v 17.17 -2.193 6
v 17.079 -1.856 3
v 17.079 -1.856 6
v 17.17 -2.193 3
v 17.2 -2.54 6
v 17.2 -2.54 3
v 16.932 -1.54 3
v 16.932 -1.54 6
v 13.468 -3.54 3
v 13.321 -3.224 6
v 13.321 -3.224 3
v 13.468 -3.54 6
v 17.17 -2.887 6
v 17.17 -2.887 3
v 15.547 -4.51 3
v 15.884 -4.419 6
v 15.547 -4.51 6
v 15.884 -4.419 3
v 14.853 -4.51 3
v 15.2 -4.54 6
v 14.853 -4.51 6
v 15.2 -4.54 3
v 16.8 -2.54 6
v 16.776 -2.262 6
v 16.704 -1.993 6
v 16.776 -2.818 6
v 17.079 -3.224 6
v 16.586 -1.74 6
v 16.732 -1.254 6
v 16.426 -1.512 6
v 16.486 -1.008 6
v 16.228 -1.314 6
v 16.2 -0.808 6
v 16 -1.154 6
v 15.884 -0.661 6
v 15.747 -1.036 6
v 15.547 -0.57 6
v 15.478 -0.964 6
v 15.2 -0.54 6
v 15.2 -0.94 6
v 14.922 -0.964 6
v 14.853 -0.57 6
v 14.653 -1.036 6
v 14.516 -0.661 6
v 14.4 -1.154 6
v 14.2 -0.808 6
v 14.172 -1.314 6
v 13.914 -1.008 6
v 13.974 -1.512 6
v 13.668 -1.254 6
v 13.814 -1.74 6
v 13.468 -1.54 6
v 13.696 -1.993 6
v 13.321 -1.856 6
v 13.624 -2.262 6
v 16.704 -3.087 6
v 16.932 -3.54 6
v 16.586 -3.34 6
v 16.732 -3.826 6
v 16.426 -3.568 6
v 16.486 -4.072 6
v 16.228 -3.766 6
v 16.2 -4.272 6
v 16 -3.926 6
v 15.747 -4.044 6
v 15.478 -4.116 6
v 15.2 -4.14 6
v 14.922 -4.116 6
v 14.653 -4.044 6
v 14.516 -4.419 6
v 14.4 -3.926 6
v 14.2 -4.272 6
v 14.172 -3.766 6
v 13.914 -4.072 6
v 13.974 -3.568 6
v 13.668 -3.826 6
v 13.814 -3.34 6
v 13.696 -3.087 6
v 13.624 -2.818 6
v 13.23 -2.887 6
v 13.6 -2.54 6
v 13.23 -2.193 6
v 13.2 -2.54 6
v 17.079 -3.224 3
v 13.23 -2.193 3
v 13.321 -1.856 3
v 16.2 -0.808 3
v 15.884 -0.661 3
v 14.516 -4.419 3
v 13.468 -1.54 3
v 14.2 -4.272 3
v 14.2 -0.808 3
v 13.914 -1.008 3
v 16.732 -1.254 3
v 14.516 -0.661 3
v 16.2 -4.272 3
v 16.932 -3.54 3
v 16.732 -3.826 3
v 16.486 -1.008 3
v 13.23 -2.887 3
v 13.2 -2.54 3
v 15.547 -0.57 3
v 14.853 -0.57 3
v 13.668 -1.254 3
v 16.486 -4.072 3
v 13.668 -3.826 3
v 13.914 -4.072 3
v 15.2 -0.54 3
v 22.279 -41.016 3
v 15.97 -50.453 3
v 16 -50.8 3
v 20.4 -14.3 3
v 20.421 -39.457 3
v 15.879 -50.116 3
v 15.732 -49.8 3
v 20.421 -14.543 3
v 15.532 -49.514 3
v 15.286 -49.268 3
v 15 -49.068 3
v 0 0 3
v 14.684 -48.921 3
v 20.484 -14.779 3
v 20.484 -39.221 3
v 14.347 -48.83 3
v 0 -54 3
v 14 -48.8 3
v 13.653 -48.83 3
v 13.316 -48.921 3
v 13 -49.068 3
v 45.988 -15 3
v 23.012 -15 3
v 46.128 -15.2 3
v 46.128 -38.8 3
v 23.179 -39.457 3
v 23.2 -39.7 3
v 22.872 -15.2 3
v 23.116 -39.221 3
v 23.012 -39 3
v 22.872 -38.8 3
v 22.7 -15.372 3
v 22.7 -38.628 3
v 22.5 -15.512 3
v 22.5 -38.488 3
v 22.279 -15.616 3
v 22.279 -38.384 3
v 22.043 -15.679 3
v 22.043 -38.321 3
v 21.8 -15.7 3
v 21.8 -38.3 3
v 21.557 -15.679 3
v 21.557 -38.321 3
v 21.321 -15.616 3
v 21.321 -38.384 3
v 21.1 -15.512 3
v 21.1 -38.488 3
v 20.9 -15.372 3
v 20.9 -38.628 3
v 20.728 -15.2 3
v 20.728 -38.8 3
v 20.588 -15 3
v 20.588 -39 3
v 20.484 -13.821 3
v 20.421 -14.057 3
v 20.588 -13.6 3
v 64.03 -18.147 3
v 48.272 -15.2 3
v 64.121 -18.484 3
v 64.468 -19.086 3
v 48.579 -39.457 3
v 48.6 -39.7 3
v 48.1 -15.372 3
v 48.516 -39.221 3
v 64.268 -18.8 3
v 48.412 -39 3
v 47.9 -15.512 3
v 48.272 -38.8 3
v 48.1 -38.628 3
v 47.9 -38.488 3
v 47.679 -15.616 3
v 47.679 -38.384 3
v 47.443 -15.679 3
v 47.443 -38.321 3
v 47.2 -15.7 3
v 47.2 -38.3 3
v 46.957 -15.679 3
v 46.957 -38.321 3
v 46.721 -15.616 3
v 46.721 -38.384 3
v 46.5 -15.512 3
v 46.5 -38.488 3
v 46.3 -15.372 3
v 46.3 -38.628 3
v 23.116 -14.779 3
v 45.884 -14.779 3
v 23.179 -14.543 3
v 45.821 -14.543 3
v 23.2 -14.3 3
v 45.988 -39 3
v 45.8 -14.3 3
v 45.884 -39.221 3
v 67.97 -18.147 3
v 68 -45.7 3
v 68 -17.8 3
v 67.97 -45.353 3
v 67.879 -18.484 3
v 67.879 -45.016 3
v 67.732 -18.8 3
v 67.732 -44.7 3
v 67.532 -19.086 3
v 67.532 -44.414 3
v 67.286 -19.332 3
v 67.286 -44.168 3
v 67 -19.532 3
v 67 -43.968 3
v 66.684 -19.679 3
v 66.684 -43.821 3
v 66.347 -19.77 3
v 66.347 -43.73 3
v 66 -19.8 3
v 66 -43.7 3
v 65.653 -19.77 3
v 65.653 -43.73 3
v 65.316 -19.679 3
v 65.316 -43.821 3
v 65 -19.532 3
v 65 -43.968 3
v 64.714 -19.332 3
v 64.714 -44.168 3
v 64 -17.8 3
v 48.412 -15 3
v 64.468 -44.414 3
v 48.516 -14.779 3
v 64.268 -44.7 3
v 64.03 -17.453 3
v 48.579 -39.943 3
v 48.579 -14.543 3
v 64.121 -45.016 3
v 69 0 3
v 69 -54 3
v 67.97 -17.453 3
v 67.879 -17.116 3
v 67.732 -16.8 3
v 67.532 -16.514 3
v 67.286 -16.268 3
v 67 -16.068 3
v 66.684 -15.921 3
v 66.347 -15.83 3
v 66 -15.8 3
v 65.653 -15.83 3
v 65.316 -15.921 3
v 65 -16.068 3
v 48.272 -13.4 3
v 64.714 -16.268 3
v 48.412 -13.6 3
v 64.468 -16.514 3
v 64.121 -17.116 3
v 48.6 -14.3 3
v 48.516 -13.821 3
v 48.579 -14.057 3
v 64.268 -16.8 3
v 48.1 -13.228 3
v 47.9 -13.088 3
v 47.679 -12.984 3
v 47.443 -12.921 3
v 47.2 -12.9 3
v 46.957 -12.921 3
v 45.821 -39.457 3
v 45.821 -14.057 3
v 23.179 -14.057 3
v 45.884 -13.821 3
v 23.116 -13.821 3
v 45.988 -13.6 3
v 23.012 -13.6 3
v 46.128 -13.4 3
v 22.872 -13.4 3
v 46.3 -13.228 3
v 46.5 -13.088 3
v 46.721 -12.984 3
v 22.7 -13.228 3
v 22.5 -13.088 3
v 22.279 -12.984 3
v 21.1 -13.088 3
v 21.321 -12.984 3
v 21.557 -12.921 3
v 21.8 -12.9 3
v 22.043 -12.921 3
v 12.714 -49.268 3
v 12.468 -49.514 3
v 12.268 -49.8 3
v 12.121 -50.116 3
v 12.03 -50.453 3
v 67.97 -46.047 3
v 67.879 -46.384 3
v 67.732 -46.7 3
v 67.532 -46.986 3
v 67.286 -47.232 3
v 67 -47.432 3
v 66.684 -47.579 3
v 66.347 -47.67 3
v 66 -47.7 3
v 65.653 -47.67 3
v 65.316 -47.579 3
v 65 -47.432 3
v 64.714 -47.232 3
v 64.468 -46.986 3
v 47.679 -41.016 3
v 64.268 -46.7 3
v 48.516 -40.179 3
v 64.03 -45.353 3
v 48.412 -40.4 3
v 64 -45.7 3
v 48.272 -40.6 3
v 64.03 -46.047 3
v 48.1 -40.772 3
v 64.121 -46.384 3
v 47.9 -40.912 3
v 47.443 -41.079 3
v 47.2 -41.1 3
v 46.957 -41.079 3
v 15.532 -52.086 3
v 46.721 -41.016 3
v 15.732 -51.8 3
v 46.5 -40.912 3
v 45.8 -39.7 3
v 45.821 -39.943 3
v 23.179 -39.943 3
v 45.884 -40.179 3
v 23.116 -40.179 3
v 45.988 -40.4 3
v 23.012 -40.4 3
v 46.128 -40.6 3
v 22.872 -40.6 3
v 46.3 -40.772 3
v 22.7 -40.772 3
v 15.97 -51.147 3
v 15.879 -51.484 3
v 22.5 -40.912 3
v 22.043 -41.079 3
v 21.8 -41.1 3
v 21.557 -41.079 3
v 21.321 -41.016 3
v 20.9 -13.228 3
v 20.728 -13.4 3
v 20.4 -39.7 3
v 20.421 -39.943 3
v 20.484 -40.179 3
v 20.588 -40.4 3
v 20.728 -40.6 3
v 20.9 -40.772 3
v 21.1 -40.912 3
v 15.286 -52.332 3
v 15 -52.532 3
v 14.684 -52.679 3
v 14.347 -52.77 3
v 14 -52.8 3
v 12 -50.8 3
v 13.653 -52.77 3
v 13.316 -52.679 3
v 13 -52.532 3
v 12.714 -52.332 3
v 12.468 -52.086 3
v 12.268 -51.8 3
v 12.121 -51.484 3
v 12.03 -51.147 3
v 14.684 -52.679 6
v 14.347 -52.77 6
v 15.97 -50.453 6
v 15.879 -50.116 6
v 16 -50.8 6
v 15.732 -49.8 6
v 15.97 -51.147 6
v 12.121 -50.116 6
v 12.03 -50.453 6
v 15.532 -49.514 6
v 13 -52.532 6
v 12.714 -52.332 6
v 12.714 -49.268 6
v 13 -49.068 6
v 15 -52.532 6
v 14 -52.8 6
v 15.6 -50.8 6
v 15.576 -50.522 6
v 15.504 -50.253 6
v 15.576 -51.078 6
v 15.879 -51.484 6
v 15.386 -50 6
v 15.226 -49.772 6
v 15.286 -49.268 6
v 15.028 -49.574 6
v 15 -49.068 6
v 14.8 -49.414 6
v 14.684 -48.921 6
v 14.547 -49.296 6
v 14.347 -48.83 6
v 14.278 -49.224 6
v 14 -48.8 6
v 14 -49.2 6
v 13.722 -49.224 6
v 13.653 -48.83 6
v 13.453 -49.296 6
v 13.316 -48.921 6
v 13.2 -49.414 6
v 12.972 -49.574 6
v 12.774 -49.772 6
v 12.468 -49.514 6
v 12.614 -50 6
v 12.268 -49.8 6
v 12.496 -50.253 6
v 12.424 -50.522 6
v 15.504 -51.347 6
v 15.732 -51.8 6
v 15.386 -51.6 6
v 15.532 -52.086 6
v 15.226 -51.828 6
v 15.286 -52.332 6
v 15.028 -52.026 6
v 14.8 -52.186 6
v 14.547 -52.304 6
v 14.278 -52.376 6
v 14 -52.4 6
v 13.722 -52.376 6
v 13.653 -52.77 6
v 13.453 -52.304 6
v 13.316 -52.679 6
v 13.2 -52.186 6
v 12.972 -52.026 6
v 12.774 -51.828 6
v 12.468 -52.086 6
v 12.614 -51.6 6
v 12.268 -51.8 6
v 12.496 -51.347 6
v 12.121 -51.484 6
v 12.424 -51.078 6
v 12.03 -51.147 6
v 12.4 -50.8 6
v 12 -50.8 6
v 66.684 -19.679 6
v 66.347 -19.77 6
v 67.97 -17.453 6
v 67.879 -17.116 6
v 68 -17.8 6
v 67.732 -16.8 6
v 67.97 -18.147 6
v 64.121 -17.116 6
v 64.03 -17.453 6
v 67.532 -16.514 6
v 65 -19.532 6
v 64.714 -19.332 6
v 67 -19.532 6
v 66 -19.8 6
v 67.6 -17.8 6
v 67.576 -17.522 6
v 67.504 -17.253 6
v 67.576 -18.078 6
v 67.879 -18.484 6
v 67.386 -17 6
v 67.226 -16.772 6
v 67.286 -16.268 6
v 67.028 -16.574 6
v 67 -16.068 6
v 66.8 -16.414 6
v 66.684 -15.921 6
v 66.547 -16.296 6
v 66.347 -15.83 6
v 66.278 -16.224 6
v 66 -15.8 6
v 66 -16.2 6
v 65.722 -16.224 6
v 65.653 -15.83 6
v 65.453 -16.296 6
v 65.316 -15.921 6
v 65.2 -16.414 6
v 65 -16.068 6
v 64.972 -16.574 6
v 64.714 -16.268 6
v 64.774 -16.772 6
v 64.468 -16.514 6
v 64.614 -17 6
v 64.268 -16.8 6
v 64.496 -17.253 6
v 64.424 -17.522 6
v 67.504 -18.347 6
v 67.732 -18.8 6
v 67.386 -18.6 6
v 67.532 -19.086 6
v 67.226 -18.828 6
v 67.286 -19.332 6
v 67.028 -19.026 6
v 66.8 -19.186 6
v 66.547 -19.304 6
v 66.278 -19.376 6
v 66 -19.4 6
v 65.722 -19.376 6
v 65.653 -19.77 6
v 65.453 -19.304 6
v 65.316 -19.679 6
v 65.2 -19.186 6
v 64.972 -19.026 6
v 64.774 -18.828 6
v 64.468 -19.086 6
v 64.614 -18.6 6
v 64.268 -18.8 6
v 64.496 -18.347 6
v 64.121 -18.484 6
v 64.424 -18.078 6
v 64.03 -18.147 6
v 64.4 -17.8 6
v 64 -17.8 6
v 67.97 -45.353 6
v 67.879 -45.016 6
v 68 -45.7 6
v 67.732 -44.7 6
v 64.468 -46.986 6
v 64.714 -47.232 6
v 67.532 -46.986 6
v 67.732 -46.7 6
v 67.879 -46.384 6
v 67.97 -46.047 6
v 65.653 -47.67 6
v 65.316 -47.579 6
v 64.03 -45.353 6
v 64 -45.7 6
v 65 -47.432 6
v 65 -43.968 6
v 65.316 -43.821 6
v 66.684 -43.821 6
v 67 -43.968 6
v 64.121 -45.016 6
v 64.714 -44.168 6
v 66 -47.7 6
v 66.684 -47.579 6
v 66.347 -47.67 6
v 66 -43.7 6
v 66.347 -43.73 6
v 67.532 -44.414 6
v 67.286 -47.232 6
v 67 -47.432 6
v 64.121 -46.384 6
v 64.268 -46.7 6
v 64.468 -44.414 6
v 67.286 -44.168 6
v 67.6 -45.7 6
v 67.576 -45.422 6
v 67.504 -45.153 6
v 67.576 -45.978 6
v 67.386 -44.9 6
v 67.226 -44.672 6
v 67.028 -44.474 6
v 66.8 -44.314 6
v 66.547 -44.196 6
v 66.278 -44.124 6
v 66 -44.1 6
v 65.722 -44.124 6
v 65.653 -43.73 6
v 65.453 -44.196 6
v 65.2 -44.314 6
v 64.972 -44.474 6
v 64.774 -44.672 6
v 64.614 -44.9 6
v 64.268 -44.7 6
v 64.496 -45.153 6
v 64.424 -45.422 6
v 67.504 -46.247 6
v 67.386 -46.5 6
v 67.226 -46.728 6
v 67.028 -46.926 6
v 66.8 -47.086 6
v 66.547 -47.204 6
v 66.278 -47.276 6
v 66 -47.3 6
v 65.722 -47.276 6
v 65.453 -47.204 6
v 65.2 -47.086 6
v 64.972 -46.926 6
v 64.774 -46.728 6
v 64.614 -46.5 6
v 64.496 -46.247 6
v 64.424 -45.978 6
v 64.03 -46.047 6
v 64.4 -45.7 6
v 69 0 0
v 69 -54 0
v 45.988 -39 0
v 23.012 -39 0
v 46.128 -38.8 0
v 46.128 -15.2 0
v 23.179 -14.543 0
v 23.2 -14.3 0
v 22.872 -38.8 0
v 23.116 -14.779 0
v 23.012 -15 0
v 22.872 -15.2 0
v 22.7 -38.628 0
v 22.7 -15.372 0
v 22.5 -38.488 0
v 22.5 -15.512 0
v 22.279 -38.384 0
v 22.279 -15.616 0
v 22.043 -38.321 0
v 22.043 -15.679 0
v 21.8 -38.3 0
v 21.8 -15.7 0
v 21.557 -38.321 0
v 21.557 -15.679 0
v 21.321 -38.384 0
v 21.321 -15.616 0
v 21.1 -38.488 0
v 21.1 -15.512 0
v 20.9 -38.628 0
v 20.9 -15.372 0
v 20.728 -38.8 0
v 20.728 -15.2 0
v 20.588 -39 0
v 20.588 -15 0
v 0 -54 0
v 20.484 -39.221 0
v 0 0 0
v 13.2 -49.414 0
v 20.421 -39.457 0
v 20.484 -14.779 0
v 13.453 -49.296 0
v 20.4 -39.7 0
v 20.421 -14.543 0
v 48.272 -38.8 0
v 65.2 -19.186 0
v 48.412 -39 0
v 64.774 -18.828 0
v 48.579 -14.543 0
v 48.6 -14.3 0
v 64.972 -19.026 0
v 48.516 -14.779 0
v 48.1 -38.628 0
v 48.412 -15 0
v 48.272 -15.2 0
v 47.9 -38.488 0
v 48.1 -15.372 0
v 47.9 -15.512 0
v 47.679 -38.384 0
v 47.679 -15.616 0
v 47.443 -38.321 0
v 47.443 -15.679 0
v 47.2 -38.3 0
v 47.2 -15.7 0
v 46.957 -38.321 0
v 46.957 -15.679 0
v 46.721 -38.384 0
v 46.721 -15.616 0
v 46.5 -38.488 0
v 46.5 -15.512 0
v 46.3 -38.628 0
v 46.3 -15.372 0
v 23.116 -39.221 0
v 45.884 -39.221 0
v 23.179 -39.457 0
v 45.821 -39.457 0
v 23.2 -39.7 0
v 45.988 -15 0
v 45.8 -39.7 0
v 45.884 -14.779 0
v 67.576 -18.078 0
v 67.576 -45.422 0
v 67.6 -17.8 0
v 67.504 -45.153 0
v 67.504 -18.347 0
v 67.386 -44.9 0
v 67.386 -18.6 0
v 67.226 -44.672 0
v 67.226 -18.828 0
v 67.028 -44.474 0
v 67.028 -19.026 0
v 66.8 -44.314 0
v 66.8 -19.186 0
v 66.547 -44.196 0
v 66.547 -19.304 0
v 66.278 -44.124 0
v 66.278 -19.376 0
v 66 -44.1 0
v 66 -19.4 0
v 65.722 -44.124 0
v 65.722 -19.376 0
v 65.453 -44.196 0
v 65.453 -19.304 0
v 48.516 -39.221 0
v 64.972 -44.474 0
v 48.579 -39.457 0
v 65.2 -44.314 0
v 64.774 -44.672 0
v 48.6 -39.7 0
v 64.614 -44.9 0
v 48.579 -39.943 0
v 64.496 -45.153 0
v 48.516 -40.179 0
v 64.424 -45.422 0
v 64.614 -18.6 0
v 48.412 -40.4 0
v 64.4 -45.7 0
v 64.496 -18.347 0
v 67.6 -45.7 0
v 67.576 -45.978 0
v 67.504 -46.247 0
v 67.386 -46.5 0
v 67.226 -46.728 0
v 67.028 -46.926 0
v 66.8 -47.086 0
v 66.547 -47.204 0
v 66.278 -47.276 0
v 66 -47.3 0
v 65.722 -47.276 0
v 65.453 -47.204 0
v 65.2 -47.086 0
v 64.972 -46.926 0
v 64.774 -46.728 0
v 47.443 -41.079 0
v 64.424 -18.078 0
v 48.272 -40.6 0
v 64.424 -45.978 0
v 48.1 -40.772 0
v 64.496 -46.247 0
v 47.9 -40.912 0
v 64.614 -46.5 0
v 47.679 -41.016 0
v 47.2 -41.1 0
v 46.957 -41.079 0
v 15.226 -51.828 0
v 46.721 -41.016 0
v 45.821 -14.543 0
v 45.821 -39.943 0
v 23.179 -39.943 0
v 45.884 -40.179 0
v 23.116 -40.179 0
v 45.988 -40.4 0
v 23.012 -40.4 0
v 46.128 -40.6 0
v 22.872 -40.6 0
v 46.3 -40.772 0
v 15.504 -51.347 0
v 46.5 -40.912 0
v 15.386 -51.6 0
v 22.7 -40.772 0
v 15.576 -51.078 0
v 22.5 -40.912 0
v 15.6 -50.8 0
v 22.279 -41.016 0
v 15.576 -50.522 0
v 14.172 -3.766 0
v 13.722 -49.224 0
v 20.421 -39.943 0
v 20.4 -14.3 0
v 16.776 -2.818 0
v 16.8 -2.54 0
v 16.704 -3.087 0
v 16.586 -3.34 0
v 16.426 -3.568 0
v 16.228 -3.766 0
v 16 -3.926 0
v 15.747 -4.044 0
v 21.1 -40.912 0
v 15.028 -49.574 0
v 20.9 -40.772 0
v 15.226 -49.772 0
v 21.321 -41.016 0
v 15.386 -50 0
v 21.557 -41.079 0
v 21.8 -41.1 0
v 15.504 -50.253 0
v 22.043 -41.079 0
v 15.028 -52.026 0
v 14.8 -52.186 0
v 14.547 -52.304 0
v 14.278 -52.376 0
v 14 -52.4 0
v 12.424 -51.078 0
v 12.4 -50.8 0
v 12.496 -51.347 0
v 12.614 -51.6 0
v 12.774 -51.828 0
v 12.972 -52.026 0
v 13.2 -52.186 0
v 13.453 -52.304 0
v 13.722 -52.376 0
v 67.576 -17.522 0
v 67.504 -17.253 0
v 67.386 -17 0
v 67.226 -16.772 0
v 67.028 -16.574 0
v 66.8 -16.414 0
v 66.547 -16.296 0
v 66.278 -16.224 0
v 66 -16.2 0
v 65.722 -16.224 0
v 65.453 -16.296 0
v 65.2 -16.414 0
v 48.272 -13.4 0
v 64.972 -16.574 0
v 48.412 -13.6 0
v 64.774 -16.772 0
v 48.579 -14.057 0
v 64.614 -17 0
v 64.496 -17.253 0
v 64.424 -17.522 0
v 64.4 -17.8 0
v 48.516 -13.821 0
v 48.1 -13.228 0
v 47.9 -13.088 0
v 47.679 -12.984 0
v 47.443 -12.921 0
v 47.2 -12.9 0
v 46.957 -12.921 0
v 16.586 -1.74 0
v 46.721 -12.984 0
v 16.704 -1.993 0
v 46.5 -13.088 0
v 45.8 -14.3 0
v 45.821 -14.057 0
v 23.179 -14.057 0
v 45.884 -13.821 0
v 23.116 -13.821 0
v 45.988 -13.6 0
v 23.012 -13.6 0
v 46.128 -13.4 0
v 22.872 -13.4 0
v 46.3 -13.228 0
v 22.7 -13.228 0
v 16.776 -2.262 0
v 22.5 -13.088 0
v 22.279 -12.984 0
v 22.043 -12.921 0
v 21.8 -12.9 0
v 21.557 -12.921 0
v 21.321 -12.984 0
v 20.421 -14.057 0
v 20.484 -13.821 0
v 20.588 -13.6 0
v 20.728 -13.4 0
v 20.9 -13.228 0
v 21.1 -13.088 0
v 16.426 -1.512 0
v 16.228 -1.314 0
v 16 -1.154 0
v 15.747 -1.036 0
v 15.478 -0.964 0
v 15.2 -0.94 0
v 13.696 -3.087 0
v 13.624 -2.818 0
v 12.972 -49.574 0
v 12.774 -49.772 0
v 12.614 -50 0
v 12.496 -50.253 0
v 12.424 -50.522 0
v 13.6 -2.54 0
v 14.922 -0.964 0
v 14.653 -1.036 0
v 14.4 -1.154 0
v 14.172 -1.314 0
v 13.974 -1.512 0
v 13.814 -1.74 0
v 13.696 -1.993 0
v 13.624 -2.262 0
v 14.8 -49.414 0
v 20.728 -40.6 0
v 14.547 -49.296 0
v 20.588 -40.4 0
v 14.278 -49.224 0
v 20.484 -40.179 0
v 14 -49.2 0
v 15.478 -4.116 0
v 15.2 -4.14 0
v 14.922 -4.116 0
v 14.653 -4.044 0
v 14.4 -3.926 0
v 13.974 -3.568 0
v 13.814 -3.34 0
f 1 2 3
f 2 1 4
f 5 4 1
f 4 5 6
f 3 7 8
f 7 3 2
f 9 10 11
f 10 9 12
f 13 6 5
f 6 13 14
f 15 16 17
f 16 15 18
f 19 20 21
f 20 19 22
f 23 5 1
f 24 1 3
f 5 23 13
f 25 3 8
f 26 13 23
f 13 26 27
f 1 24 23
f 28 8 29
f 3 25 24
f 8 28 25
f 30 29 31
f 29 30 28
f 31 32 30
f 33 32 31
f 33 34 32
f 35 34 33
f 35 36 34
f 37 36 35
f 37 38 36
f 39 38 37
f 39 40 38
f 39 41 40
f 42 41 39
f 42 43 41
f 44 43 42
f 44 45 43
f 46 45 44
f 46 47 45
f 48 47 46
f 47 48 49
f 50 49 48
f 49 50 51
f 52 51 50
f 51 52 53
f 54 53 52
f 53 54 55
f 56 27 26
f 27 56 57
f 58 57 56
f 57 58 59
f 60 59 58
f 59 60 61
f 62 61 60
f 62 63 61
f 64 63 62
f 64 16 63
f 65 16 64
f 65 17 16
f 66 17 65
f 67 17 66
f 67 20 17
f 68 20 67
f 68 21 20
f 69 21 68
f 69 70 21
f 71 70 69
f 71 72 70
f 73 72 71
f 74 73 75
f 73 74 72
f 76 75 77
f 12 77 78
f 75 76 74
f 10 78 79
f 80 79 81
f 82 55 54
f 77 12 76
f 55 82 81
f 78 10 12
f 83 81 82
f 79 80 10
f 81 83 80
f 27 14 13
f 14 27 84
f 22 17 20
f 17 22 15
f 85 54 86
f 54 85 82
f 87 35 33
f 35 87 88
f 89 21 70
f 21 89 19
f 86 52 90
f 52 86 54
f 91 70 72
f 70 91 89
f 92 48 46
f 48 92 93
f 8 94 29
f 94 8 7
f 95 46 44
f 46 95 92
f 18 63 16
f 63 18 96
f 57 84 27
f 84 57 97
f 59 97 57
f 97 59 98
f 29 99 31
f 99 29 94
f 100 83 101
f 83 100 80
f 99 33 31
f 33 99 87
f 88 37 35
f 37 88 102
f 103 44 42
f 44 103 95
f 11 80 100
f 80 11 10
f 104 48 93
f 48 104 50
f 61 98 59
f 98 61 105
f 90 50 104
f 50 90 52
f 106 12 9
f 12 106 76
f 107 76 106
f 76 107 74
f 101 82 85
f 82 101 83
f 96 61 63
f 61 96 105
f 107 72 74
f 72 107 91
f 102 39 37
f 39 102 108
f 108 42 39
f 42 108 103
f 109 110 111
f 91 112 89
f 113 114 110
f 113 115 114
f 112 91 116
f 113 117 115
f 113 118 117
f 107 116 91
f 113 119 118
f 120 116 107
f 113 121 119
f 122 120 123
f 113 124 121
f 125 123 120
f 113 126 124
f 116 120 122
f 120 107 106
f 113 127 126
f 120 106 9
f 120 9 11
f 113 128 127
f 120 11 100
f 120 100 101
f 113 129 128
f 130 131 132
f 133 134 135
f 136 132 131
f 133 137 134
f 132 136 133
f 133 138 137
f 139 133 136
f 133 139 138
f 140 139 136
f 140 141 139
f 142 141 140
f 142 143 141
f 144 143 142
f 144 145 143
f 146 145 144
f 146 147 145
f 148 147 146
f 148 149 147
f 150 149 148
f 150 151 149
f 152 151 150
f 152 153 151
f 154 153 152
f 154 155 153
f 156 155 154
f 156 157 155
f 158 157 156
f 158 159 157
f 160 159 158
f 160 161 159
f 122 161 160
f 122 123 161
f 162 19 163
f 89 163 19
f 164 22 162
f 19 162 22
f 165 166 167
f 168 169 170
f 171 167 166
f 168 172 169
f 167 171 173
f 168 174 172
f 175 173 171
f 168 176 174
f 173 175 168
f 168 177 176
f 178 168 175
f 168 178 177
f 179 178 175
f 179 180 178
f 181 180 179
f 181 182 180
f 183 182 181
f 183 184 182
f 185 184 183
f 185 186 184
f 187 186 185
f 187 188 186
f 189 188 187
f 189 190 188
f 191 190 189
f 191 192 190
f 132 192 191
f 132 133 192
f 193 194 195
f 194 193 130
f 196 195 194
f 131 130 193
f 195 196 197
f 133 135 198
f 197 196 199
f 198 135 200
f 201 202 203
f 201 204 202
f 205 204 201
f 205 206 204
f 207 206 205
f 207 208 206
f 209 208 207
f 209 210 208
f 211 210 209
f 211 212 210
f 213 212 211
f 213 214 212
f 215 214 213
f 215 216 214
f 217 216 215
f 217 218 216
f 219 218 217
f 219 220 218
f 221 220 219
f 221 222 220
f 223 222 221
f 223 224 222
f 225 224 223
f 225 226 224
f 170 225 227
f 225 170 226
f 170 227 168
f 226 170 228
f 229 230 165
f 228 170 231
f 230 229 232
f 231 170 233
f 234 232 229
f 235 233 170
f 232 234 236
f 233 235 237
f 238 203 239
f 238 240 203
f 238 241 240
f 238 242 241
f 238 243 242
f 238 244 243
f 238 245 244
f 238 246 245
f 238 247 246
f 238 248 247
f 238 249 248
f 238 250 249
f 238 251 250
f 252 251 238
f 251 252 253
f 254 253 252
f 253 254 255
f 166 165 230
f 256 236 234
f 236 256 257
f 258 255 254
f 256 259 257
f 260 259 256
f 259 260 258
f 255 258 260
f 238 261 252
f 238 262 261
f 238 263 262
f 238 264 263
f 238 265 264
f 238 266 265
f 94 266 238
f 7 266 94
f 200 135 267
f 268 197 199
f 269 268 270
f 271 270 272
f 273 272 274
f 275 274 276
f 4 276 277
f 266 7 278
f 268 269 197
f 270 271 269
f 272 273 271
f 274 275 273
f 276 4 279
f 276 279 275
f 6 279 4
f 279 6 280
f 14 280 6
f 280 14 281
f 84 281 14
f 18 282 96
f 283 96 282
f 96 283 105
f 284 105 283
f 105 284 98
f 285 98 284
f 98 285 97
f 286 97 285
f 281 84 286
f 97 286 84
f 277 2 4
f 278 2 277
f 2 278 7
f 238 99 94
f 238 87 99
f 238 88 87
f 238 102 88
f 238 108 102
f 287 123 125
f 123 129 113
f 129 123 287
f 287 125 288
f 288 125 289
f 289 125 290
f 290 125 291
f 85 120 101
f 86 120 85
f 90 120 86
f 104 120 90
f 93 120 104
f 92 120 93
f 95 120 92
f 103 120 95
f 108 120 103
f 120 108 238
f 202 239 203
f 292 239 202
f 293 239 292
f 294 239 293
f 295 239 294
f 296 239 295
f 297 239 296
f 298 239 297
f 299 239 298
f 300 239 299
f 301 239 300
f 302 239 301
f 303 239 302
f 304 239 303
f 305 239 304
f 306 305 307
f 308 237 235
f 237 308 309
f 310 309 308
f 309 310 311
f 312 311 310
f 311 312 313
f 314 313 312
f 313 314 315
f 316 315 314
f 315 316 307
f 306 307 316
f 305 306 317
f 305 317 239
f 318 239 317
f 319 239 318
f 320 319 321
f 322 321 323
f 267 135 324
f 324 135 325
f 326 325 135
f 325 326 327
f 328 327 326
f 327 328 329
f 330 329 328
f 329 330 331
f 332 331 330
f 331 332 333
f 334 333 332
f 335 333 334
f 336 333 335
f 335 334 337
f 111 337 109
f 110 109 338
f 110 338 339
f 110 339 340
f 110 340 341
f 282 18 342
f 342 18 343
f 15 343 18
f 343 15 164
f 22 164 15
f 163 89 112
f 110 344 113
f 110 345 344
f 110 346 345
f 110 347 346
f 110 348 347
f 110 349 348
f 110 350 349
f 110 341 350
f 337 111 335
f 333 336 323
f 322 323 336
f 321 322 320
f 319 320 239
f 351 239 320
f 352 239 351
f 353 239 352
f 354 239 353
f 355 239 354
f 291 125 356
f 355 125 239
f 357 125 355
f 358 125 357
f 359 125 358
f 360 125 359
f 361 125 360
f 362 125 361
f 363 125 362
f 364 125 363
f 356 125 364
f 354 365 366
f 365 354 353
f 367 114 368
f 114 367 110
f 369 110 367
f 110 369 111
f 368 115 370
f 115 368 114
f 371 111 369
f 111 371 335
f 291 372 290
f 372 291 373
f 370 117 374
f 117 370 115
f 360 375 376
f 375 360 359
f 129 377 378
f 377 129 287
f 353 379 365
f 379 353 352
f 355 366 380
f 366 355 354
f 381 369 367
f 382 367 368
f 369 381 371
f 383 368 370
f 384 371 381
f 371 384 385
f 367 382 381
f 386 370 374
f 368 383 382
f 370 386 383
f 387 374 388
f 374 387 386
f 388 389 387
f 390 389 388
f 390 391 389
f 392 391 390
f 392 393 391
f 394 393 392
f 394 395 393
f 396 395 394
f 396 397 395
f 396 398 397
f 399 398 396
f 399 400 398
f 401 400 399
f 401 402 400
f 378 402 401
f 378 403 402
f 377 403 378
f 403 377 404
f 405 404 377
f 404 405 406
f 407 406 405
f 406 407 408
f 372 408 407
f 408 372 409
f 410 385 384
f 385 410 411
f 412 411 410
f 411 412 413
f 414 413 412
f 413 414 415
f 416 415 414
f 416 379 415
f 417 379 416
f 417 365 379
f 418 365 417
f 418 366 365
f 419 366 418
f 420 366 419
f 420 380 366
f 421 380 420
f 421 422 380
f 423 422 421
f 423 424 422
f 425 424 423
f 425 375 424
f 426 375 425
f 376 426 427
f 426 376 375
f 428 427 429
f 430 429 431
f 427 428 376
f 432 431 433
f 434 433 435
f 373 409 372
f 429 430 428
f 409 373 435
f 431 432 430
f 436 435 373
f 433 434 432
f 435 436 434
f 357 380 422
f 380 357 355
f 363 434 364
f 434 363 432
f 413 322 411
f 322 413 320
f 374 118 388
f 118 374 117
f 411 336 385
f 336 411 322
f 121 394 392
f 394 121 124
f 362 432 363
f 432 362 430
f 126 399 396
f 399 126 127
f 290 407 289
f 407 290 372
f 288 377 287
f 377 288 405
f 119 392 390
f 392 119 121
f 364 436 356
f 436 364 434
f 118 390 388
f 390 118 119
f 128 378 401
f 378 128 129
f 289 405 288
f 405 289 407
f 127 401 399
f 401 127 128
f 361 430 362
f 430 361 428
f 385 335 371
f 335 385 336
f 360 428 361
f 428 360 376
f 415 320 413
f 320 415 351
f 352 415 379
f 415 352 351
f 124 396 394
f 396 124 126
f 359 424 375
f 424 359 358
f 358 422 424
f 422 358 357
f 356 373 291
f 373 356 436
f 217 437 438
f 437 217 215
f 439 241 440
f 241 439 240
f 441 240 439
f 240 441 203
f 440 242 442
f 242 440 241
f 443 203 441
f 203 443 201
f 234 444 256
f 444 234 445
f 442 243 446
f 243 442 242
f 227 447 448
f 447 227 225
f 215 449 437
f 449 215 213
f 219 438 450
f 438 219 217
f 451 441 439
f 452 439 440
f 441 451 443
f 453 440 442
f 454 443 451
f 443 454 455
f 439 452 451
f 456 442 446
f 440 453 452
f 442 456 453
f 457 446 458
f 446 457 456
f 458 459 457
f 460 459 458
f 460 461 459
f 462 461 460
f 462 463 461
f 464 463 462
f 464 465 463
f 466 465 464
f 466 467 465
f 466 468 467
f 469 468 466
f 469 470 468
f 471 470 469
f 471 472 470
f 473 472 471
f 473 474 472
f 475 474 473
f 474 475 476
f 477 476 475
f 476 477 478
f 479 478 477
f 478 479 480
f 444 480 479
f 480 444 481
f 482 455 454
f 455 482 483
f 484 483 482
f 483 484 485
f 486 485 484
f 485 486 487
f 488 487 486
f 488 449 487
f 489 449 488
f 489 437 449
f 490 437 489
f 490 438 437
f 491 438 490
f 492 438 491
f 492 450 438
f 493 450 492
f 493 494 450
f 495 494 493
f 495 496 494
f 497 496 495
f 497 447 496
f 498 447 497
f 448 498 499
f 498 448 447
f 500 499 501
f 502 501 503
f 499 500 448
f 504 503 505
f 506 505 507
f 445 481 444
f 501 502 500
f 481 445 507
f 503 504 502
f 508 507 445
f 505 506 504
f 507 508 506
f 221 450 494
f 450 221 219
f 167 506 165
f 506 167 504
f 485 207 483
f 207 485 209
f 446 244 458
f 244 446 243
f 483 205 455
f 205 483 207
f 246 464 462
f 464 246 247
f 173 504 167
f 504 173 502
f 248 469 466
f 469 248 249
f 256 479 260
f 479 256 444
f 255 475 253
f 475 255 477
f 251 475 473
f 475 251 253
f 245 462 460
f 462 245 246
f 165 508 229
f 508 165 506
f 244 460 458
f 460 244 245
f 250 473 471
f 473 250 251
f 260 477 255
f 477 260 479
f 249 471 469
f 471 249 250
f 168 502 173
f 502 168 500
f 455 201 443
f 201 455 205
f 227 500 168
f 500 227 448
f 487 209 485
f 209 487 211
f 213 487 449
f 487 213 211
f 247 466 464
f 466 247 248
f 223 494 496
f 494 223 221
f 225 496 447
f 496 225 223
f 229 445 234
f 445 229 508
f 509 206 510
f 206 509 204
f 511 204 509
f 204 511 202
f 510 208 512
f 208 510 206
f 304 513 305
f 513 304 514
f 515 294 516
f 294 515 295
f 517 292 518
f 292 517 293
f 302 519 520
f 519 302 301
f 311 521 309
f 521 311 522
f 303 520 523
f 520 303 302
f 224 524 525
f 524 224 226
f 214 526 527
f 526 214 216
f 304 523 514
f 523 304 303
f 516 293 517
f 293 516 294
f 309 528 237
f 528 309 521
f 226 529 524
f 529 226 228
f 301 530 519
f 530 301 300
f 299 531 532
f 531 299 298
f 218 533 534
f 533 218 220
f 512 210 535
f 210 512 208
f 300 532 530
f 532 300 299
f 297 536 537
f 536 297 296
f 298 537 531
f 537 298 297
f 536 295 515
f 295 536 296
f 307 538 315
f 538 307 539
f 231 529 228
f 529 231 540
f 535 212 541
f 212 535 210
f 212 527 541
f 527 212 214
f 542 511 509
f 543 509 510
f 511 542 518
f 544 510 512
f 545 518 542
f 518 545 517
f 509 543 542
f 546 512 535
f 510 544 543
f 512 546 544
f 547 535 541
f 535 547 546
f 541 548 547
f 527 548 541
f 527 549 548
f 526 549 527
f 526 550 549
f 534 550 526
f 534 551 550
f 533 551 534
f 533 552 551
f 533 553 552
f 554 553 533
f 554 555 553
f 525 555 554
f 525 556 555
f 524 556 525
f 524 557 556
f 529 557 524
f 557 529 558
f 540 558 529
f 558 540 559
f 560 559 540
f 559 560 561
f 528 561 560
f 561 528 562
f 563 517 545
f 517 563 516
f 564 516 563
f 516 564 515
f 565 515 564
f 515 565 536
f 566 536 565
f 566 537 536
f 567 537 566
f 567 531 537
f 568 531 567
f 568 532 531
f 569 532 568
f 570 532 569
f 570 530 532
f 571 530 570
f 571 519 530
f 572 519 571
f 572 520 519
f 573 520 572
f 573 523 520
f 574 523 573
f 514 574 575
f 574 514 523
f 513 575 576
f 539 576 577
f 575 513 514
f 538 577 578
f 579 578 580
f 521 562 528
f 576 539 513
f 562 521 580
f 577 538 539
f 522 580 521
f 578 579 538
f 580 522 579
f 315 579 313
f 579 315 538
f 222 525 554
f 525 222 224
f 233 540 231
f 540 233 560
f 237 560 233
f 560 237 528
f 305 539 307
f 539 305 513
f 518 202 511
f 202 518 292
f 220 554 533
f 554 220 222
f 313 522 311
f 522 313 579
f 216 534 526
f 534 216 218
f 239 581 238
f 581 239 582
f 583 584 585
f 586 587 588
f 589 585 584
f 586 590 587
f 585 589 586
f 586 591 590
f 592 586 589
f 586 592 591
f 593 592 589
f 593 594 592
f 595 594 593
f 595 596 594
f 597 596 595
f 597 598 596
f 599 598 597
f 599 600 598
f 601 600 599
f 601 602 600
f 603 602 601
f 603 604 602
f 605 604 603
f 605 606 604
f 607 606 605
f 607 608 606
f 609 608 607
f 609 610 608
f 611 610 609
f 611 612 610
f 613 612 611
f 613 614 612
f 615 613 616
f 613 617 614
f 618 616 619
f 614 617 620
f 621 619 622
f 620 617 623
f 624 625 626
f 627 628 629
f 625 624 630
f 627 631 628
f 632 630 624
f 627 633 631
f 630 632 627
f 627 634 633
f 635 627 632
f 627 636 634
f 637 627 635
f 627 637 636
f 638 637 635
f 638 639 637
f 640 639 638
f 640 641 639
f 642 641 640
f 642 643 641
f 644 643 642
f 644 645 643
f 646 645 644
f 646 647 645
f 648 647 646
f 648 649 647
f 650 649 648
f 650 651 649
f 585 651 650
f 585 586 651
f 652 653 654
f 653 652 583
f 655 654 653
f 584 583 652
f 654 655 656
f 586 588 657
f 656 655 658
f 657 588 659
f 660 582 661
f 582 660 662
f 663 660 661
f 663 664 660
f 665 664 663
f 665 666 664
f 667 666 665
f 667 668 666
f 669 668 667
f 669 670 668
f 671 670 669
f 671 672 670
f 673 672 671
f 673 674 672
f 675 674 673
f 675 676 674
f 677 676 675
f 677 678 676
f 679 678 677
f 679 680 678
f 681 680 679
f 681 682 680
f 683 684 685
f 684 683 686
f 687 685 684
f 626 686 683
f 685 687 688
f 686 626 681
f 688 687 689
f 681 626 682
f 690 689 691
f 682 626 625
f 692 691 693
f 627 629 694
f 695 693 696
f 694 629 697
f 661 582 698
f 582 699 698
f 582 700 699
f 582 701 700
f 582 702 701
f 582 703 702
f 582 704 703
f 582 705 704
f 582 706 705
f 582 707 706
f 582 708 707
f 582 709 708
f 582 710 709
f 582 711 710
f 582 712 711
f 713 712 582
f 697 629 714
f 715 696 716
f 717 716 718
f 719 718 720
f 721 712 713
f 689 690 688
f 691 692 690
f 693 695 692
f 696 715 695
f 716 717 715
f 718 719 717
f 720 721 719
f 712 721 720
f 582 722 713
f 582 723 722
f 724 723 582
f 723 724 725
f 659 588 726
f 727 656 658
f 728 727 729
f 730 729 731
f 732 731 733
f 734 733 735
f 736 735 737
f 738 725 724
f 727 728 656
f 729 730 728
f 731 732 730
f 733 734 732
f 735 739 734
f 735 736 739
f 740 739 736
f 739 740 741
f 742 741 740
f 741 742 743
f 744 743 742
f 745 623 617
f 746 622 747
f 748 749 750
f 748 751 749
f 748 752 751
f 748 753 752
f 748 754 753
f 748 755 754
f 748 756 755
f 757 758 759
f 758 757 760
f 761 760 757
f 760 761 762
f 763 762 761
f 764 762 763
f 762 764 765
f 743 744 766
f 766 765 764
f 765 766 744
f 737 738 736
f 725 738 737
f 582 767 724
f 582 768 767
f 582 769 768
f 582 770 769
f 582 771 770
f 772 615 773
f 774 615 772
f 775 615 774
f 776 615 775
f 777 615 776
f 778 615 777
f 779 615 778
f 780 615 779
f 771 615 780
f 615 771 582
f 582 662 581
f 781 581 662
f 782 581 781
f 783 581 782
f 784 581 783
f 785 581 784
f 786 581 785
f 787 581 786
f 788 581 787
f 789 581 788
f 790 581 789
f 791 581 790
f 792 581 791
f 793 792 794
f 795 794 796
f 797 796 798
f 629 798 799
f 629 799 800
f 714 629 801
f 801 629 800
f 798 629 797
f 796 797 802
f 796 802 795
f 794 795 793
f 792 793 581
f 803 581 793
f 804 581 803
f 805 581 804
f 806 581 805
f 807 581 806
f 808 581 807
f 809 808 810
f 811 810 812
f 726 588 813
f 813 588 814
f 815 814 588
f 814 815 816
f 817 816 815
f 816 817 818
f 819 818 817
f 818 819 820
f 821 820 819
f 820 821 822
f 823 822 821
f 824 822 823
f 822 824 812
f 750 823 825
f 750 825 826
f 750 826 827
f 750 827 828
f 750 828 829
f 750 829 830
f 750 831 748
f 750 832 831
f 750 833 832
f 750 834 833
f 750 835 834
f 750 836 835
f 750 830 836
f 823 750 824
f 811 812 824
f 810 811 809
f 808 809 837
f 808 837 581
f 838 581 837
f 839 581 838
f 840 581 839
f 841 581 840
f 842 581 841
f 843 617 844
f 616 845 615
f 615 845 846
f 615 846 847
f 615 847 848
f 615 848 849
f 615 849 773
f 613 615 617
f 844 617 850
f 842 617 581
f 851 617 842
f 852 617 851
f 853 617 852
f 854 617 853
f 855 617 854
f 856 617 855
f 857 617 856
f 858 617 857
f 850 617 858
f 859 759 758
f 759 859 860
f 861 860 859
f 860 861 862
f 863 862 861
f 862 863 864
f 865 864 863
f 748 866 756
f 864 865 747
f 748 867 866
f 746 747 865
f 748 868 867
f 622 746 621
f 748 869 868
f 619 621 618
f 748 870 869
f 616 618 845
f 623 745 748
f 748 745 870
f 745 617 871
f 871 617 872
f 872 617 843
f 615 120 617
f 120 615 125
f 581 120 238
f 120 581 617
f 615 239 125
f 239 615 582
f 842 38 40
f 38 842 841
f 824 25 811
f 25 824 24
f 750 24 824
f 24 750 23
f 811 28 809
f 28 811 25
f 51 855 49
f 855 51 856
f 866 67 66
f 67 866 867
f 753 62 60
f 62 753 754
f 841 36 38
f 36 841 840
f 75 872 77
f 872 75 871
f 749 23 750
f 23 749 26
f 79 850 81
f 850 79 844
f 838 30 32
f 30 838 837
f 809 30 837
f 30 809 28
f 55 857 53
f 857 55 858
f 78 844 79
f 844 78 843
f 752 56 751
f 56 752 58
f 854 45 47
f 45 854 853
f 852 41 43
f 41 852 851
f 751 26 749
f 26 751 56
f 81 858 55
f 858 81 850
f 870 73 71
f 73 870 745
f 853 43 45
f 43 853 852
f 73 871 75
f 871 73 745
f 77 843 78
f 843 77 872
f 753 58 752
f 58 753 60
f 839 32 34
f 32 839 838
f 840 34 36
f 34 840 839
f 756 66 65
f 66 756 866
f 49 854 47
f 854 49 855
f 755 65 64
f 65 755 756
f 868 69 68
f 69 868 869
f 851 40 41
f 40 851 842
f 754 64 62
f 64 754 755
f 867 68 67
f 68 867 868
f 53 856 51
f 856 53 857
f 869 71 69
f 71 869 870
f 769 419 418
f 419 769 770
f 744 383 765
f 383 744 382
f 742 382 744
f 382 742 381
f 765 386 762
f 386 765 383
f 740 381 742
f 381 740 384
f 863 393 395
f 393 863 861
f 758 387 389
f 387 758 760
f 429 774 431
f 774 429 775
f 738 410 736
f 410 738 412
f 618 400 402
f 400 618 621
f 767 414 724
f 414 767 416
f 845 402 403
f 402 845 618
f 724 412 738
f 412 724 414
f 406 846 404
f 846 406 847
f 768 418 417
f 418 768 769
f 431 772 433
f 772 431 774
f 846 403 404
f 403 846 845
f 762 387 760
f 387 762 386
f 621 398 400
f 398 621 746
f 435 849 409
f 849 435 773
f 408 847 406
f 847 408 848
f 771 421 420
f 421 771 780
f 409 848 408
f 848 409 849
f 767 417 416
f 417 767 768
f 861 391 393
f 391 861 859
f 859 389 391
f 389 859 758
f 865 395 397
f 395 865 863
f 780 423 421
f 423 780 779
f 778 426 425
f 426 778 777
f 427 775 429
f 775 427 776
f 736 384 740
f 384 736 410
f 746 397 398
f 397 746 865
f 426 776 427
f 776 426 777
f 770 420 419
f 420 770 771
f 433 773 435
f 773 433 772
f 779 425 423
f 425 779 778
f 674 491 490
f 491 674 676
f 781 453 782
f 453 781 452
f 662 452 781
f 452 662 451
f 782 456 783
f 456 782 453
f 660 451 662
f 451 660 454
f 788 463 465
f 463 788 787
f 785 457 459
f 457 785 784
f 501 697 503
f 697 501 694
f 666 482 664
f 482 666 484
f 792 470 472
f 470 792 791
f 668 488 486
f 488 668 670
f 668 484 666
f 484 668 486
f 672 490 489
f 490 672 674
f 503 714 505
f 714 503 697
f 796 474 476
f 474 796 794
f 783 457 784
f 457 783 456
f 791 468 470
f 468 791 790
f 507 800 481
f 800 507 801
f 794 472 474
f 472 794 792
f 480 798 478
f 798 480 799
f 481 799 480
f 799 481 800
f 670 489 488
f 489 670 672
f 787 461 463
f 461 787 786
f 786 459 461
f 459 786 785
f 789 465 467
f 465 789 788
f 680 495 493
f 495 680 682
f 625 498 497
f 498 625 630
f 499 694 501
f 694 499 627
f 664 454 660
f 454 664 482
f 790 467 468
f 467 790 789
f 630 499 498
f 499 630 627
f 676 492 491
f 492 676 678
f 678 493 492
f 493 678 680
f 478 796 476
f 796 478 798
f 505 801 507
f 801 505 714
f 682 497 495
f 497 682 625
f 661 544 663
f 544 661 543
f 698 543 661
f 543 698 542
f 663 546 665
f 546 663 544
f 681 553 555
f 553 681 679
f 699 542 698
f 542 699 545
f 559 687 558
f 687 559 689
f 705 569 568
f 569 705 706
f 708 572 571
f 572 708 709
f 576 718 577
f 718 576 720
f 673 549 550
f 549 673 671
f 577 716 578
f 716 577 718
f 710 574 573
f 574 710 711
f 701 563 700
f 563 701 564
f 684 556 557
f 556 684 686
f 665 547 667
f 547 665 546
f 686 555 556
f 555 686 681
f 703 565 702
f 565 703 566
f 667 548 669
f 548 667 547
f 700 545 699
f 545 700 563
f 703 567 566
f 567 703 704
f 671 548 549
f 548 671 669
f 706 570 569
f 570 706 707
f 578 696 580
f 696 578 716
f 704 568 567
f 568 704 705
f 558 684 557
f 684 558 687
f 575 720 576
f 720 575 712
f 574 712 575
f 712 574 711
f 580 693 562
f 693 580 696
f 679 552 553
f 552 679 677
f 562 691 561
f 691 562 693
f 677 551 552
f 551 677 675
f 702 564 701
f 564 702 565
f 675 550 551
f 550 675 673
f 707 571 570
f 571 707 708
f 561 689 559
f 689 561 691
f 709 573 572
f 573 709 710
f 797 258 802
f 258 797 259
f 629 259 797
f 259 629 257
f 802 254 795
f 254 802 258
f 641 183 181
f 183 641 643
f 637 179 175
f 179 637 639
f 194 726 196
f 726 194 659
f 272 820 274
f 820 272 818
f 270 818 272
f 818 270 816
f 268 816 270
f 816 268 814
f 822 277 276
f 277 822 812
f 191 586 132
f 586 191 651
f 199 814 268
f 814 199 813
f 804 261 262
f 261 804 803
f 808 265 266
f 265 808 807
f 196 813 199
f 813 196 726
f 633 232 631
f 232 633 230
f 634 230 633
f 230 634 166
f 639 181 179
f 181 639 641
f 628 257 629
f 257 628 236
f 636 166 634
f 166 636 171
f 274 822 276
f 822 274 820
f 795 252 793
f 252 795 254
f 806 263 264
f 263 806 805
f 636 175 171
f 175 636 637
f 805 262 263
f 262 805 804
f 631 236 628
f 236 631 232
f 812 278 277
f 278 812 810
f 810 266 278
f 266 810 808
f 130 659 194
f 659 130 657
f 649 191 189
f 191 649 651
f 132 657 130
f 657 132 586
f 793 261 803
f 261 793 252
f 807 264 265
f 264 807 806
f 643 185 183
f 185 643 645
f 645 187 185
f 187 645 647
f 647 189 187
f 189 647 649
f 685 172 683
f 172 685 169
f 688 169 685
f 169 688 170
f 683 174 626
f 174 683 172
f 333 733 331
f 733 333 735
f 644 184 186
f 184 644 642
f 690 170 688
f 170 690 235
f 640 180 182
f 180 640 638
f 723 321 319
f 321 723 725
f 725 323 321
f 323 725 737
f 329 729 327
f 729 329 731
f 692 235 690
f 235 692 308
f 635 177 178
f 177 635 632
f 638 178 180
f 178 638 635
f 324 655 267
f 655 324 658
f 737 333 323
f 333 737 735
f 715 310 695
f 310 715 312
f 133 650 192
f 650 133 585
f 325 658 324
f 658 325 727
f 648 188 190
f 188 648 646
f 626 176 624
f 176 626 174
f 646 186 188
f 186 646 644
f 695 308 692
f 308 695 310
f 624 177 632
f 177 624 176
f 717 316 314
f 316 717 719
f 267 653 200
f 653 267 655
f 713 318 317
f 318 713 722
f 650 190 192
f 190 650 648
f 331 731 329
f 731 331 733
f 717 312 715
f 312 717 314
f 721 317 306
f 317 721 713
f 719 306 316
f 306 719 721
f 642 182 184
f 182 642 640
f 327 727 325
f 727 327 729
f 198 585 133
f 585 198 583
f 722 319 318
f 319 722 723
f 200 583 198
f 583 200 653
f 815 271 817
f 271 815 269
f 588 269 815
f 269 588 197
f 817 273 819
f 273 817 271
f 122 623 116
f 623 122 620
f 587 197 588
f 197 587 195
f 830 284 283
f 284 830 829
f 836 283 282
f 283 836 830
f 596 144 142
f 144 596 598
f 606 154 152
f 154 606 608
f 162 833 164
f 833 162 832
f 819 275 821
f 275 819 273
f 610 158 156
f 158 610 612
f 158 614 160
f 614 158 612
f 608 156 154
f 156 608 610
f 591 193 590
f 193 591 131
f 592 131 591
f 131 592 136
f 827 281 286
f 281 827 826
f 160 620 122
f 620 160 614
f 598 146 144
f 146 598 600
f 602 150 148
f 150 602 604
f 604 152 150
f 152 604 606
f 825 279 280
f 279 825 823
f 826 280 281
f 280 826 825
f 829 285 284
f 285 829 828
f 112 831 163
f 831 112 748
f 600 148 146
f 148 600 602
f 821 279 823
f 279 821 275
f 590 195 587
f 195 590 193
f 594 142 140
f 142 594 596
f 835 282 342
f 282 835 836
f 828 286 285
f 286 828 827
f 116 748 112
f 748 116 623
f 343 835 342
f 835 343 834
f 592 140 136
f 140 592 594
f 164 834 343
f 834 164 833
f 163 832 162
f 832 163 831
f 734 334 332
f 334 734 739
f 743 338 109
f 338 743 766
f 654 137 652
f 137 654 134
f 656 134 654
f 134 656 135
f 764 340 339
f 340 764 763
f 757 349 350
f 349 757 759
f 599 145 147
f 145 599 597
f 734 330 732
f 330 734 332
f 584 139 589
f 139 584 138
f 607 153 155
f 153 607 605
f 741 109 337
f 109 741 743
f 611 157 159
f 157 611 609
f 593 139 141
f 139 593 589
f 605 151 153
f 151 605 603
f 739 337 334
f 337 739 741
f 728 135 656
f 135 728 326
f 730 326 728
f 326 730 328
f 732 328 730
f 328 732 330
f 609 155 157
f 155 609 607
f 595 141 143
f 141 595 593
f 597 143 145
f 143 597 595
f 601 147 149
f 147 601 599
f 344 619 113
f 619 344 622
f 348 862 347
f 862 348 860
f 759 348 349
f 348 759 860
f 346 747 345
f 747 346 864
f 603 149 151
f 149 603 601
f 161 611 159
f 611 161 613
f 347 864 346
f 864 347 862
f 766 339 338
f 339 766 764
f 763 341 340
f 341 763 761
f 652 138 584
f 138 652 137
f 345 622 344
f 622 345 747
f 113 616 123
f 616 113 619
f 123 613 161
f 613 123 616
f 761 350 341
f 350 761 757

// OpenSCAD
//
// Arduino Uno Rev.3
//
// ArduinoUnoRev3-1-20250515C.scad
//
// https://makezine.jp/blog/2011/01/nice_drawings_of_the_arduino_uno_an.html
//
// Last update: 2025-05-16(Fri) 06:21 JST / 2025-05-15(Thu) 21:21 UTC
// Last update: 2025-05-25(Sun) 08:08 JST / 2025-05-24(Sat) 23:08 UTC
//

Px = 69.0; Py = -54.0; Pz = 3.0;    // パネルの 横・縦・厚さ （P は "Panel" の P）
Cd = 4.0;  Cz = 3.0;                // 円柱の直径、位置、厚さ （Cは "Cylinder" の C）
H1d = 3.2; H2d = 2.8;               // 穴1,穴2の直径 （H は "Hole" の H）

// 穴1の位置リスト
hole1_pos = [
    [ 15.2, -2.54 ],
    [ 14.0, -50.8 ],
    [ 66.0, -17.8 ],
    [ 66.0, -45.7 ]
];

// 穴2の位置リスト
hole2_pos = [
  [ Px/2 + 12.7, Py/2 + 12.7 ],
  [ Px/2 + 12.7, Py/2 - 12.7 ],
  [ Px/2 - 12.7, Py/2 + 12.7 ],
  [ Px/2 - 12.7, Py/2 - 12.7 ],
];

difference() {
    // (1) まず、4本の円柱を持つ直方体のパネルを作る
    union() {
        // パネルを用意
        // cube([Px, -Py, Pz]); // 第1章限で造形する場合
        translate([0, Py, 0]) cube([Px, -Py, Pz]);  // 第4象限で造形する場合
        // 円柱を4本立てる
        for (pos = hole1_pos) {
            x = pos[0]; y = pos[1];
            translate([x, y, Pz]) cylinder(h = Cz, d = Cd, $fn = 36);
        }
    }
    // (2) 次に、それぞれの円柱に穴1を貫通させる
    for (pos = hole1_pos) {
        x = pos[0]; y = pos[1];
        translate([x, y, -1.0]) cylinder(h = Pz + Cz + 2.0, d = H1d, $fn = 36);
        // 確実に穴をあけるため、パネル厚+円柱厚より2mm長い円柱をパネル底面より1mm沈めて配置
    }
    // (3) 最後に、パネルに穴2を貫通させる
    for (pos = hole2_pos) {
        x = pos[0]; y = pos[1];
        translate([x, y, -1.0]) cylinder(h = Pz + 2.0, d = H2d, $fn = 36);
        // 確実に穴をあけるため、パネル厚+円柱厚より2mm長い円柱をパネル底面より1mm沈めて配置
    }
}
